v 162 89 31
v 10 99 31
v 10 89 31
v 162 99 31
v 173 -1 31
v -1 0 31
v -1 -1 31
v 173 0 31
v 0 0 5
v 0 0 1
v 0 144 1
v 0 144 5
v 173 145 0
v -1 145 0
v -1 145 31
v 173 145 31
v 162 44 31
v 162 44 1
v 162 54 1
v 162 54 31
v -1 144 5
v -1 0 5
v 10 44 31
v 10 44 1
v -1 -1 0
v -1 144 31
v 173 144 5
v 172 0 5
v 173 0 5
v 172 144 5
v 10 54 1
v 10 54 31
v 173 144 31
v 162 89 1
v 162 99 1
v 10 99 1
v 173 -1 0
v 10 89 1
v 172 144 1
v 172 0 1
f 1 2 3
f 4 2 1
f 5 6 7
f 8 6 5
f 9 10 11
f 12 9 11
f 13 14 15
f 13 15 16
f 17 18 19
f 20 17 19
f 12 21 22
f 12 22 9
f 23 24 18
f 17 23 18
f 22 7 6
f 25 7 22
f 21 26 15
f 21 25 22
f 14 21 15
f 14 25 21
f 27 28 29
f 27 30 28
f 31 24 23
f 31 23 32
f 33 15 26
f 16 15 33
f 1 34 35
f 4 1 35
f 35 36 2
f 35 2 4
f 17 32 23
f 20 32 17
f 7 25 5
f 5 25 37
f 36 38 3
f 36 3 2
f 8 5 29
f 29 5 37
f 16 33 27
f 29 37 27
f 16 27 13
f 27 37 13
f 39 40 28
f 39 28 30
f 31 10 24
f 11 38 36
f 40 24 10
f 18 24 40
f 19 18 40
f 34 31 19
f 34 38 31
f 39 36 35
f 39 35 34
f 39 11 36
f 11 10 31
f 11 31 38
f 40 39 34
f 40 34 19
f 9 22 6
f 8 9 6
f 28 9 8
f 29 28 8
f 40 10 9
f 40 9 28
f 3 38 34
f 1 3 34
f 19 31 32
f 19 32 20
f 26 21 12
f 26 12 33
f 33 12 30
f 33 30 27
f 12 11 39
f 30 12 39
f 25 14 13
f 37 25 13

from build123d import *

# Parameters (mm, degrees)
SZKIC1_W                    = 172
SZKIC1_H                    = 144
DODANIE_WYCI_GNI_CIE1_DEPTH = 1
SZKIC1_3_W                  = 174
SZKIC1_3_H                  = 146
SZKIC1_3_W_2                = 172
SZKIC1_3_H_2                = 144
DODANIE_WYCI_GNI_CIE2_DEPTH = 5
SZKIC2_W                    = 152
SZKIC2_H                    = 10
DODANIE_WYCI_GNI_CIE4_DEPTH = 30
SZKIC4_W                    = 174
SZKIC4_H                    = 1
DODANIE_WYCI_GNI_CIE5_DEPTH = 26


with BuildPart() as part:
    # Szkic1 → Dodanie-wyciągnięcie1 (new body)
    with BuildSketch(Plane.XY):
        with Locations((86, 72)):
            Rectangle(SZKIC1_W, SZKIC1_H)
    extrude(amount=DODANIE_WYCI_GNI_CIE1_DEPTH)

    # Szkic1<3> → Dodanie-wyciągnięcie2 (add)
    with BuildSketch(Plane.XY):
        with Locations((86, 72)):
            Rectangle(SZKIC1_3_W, SZKIC1_3_H)
        with Locations((86, 72)):
            Rectangle(SZKIC1_3_W_2, SZKIC1_3_H_2, mode=Mode.SUBTRACT)
    extrude(amount=DODANIE_WYCI_GNI_CIE2_DEPTH)

    # Szkic2 → Dodanie-wyciągnięcie4 (add)
    with BuildSketch(Plane.XY.offset(1)):
        with Locations((86, 49)):
            Rectangle(SZKIC2_W, SZKIC2_H)
        with Locations((86, 94)):
            Rectangle(SZKIC2_W, SZKIC2_H)
    extrude(amount=DODANIE_WYCI_GNI_CIE4_DEPTH)

    # Szkic4 → Dodanie-wyciągnięcie5 (add)
    with BuildSketch(Plane.XY.offset(5)):
        with Locations((86, -0.5)):
            Rectangle(SZKIC4_W, SZKIC4_H)
        with Locations((86, 144.5)):
            Rectangle(SZKIC4_W, SZKIC4_H)
    extrude(amount=DODANIE_WYCI_GNI_CIE5_DEPTH)


solid = part.part
